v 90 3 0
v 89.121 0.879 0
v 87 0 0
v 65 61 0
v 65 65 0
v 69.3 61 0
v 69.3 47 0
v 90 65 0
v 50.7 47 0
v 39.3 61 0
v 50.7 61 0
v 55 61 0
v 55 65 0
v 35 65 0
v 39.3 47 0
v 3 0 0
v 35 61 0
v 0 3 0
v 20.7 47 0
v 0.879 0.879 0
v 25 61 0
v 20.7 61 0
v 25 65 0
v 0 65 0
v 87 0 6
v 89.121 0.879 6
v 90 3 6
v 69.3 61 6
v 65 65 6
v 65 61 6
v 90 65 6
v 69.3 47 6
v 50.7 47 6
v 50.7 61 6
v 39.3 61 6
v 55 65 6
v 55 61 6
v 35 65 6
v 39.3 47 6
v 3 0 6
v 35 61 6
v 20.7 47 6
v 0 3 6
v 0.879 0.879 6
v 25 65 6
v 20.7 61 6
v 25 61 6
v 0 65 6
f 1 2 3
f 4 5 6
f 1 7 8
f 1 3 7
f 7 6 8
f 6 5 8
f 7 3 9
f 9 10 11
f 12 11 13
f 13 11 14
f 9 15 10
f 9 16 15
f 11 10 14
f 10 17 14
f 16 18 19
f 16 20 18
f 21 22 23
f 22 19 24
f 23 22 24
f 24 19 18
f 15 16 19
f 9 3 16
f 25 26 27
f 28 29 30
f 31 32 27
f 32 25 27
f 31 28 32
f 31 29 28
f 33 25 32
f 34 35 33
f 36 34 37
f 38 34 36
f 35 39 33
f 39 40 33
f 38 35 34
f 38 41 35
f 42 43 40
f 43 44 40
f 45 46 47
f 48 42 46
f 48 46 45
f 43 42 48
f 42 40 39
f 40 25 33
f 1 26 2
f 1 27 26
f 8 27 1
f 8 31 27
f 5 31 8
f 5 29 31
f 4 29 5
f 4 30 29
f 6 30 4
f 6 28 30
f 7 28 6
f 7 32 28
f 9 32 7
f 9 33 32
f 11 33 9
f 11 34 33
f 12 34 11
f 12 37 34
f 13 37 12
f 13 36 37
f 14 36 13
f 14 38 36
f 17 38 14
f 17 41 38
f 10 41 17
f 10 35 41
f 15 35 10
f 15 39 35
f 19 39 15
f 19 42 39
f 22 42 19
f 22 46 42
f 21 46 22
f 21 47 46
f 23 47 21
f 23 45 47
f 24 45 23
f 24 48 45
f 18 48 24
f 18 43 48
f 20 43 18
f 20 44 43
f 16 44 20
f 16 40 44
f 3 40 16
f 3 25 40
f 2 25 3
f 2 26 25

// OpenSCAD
$fn = 32;

// ----------------------------------------------------------------------
// Window plate: 90 x 65 mm, 2 open windows
// ----------------------------------------------------------------------

// --- parameters (mm) ---
profile_height = 6;       // extrusion height
profile_points = 24;      // points of the closed outline

profile = [[0, 3], [0.879, 0.879], [3, 0], [87, 0], [89.121, 0.879], [90, 3], [90, 65], [65, 65], [65, 61], [69.3, 61], [69.3, 47], [50.7, 47], [50.7, 61], [55, 61], [55, 65], [35, 65], [35, 61], [39.3, 61], [39.3, 47], [20.7, 47], [20.7, 61], [25, 61], [25, 65], [0, 65]];  // single closed polygon, 24 points, counter clockwise

// --- the one profile operation ---
linear_extrude(height = profile_height) polygon(points = profile);
